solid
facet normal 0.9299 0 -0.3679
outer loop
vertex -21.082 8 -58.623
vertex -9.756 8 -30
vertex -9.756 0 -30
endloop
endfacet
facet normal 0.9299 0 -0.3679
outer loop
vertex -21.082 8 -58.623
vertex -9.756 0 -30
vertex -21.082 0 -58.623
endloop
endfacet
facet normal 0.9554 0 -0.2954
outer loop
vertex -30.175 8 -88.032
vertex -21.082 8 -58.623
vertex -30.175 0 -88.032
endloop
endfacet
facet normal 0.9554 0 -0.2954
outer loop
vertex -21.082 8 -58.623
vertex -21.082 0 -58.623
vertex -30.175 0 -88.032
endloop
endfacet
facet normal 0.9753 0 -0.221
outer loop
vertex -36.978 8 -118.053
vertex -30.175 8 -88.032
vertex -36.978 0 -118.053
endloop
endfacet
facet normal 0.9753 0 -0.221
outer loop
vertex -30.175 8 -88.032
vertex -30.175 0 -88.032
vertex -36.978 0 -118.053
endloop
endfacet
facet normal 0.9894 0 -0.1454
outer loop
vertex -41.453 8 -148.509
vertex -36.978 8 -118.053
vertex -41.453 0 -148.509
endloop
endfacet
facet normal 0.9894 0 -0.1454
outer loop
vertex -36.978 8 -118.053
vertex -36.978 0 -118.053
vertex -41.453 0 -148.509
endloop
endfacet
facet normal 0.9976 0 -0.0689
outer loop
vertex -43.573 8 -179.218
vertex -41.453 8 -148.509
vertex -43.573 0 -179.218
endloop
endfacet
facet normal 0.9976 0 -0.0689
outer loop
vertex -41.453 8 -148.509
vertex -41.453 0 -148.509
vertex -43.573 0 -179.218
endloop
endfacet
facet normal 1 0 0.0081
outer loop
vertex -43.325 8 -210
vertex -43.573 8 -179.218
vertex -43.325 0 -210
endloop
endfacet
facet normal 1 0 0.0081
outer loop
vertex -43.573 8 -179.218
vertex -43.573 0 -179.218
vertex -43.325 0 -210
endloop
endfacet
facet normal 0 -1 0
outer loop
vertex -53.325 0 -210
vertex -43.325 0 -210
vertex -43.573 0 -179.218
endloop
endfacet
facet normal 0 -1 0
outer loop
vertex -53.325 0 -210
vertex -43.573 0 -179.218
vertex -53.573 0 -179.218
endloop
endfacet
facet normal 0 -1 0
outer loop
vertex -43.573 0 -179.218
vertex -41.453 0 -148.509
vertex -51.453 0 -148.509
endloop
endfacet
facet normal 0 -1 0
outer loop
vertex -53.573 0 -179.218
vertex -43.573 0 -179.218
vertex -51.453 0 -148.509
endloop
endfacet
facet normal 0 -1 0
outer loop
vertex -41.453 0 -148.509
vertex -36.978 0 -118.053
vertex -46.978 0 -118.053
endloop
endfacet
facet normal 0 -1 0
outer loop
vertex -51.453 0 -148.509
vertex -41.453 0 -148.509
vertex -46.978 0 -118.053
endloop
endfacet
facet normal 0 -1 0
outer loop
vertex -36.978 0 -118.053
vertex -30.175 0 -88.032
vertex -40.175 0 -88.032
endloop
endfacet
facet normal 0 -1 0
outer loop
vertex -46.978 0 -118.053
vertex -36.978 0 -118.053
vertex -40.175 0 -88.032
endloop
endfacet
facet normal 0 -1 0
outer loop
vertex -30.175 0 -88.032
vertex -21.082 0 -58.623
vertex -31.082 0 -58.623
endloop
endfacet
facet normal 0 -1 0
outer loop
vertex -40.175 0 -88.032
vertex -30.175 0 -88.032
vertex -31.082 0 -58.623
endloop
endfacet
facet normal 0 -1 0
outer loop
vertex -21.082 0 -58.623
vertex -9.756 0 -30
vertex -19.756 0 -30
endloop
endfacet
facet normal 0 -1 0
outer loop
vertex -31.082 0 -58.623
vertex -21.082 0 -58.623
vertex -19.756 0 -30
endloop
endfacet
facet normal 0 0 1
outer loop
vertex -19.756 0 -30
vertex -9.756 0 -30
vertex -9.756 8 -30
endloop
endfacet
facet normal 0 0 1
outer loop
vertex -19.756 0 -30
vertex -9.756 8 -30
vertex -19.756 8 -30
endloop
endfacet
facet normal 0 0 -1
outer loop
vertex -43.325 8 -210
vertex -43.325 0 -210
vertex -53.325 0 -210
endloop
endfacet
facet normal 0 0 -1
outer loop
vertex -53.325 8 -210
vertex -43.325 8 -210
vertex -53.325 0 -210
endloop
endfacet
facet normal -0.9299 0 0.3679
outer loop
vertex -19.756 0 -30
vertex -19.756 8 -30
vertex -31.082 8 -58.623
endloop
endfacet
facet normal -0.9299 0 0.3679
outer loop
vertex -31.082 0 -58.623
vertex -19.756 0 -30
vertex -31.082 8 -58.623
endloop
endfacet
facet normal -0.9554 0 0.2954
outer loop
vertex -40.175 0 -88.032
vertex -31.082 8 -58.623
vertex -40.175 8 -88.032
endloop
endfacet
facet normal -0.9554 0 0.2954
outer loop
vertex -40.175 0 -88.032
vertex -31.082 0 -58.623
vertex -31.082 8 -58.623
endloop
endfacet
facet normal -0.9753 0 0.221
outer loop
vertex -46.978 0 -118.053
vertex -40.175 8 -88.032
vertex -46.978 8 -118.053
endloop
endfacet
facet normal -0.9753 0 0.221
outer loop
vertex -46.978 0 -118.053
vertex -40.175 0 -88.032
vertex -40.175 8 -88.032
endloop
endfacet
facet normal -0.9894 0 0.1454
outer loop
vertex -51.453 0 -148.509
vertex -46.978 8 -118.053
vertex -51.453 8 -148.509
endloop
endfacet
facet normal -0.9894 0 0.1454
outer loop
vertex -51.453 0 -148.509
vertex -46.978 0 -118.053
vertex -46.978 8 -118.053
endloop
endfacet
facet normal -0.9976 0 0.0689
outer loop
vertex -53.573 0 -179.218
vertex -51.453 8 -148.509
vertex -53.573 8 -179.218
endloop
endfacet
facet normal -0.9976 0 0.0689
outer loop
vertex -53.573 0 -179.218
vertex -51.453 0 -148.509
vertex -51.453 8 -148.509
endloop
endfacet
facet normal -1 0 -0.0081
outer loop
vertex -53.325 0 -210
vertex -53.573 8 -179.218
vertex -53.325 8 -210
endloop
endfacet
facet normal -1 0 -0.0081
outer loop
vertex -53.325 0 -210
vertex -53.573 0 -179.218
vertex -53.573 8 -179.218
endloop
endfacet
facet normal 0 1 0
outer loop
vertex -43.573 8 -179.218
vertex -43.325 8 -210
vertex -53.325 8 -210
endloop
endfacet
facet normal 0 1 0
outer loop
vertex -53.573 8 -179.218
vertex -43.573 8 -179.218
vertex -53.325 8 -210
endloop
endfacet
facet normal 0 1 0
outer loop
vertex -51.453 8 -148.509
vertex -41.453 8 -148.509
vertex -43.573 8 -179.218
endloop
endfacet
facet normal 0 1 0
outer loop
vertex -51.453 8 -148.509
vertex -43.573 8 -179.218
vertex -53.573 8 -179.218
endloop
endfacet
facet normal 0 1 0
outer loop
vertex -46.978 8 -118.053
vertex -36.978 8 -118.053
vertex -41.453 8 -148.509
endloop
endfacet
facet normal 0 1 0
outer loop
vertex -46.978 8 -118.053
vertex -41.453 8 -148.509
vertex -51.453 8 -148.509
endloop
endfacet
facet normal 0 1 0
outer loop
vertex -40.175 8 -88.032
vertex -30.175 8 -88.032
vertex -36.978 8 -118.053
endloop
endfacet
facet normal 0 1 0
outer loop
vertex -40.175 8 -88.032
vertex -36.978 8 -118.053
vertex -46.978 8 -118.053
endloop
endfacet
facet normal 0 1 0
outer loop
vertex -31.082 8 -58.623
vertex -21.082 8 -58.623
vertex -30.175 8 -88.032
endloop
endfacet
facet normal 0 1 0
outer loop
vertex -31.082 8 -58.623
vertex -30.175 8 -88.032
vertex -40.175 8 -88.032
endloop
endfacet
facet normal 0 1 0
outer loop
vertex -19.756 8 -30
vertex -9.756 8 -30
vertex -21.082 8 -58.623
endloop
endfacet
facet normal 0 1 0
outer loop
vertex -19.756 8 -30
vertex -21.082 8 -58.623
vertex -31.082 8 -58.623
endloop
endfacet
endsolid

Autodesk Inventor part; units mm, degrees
ref_plane "YZ Plane" through (0, 0, 0) normal (1, 0, 0) x (0, 1, 0)
ref_plane "XZ Plane" through (0, 0, 0) normal (0, 1, 0) x (-1, 0, 0)
ref_plane "XY Plane" through (0, 0, 0) normal (0, 0, 1) x (1, 0, 0)
sketch "Sketch1" plane through (0, 0, 0) normal (0, 1, 0) x (-1, 0, 0)
  line L0 (0, 0) -> (0, -382.775) construction
  line L1 (-5, 0) -> (-5, -382.775)
  line L2 (5, -382.775) -> (5, 0)
  arc A0 (5, 0) -> (-5, 0) centre (0, 0) ccw
  arc A1 (-5, -382.775) -> (5, -382.775) centre (0, -382.775) ccw
  circle A2 centre (0, 0) radius 1.5
  circle A3 centre (0, -382.775) radius 1.5
  arc A4 (5, -382.775) -> (5, 0) centre (-346.2418, -191.3875) ccw
  arc A5 (-5, -382.775) -> (-5, 0) centre (-356.2418, -191.3875) ccw
  point P0 (0, -191.3875)
  dimension "d0" = 382.775
  dimension "d1" = 10
  dimension "d2" = 3
  dimension "d3" = 3
  dimension "d12" = 400
  dimension "d13" = 400
extrude "Extrusion1" add sketch "Sketch1" along normal blind 8 contours A0 L2 A5 | A5 L2 A1 | A4 L2 A5
fillet "Fillet1" radius 2 4 edges at (5, 4, -382.775) (-5, 4, -382.775) (-5, 4, 0) (5, 4, 0)
sketch "Sketch2" plane through (0, 0, 0) normal (0, -1, 0) x (1, 0, 0)
  arc A0 (-4.9846, -383.1668) -> (4.9441, -383.5202) centre (0, -382.775) ccw projected
  arc A1 (4.9441, 0.7452) -> (-4.9846, 0.3918) centre (0, 0) ccw projected
  circle A2 centre (0, -382.775) radius 1.5 projected
  circle A3 centre (0, 0) radius 1.5 projected
  arc A4 (-5.2212, -0.4065) -> (-5.2212, -382.3685) centre (346.2418, -191.3875) ccw projected
  arc A5 (4.7241, -0.5073) -> (4.7241, -382.2677) centre (356.2418, -191.3875) ccw projected
  arc A6 (4.7241, -0.5073) -> (4.9441, 0.7452) centre (2.9665, 0.4471) ccw projected
  arc A7 (-5.2212, -0.4065) -> (-4.9846, 0.3918) centre (-6.9785, 0.5485) ccw projected
  arc A8 (-4.9846, -383.1668) -> (-5.2212, -382.3685) centre (-6.9785, -383.3235) ccw projected
  arc A9 (4.9441, -383.5202) -> (4.7241, -382.2677) centre (2.9665, -383.2221) ccw projected
sketch "Sketch3" plane through (0, 8, 0) normal (0, 1, 0) x (1, 0, 0)
  line L0 (-111.727, 425.5197) -> (93.4733, 425.5197)
  line L1 (93.4733, 425.5197) -> (93.4733, -68.38)
  line L2 (93.4733, -68.38) -> (-111.727, -68.38)
  line L3 (-111.727, -68.38) -> (-111.727, 425.5197)
  line L4 (-64.7929, 400.3549) -> (33.9871, 400.3549)
  line L5 (33.9871, 400.3549) -> (33.9871, 210)
  line L6 (33.9871, 210) -> (-64.7929, 210)
  line L7 (-64.7929, 210) -> (-64.7929, 400.3549)
  line L8 (-64.7929, 210) -> (33.9871, 210)
  line L9 (33.9871, 210) -> (33.9871, 30)
  line L10 (33.9871, 30) -> (-64.7929, 30)
  line L11 (-64.7929, 30) -> (-64.7929, 210)
  point P0 (0, 0)
  dimension "d15" = 30
  dimension "d16" = 180
  dimension "d17" = 190.3549
extrude "Extrusion2" cut sketch "Sketch3" along normal mid plane 20 contours L0 L1 L2 L3 | L4 L5 L6 L7
sketch "Sketch4" plane through (0, 8, 0) normal (0, 1, 0) x (1, 0, 0)
  line L0 (-43.3249, 210) -> (-53.3249, 210) projected
  arc A0 (-43.3249, 210) -> (-9.7555, 30) centre (356.2418, 191.3875) ccw projected
  arc A1 (-53.3249, 210) -> (-19.7555, 30) centre (346.2418, 191.3875) ccw projected
  line L1 (-19.7555, 30) -> (-9.7555, 30) projected
  point P0 (0, 0)
properties part number "Part_13_p2"
